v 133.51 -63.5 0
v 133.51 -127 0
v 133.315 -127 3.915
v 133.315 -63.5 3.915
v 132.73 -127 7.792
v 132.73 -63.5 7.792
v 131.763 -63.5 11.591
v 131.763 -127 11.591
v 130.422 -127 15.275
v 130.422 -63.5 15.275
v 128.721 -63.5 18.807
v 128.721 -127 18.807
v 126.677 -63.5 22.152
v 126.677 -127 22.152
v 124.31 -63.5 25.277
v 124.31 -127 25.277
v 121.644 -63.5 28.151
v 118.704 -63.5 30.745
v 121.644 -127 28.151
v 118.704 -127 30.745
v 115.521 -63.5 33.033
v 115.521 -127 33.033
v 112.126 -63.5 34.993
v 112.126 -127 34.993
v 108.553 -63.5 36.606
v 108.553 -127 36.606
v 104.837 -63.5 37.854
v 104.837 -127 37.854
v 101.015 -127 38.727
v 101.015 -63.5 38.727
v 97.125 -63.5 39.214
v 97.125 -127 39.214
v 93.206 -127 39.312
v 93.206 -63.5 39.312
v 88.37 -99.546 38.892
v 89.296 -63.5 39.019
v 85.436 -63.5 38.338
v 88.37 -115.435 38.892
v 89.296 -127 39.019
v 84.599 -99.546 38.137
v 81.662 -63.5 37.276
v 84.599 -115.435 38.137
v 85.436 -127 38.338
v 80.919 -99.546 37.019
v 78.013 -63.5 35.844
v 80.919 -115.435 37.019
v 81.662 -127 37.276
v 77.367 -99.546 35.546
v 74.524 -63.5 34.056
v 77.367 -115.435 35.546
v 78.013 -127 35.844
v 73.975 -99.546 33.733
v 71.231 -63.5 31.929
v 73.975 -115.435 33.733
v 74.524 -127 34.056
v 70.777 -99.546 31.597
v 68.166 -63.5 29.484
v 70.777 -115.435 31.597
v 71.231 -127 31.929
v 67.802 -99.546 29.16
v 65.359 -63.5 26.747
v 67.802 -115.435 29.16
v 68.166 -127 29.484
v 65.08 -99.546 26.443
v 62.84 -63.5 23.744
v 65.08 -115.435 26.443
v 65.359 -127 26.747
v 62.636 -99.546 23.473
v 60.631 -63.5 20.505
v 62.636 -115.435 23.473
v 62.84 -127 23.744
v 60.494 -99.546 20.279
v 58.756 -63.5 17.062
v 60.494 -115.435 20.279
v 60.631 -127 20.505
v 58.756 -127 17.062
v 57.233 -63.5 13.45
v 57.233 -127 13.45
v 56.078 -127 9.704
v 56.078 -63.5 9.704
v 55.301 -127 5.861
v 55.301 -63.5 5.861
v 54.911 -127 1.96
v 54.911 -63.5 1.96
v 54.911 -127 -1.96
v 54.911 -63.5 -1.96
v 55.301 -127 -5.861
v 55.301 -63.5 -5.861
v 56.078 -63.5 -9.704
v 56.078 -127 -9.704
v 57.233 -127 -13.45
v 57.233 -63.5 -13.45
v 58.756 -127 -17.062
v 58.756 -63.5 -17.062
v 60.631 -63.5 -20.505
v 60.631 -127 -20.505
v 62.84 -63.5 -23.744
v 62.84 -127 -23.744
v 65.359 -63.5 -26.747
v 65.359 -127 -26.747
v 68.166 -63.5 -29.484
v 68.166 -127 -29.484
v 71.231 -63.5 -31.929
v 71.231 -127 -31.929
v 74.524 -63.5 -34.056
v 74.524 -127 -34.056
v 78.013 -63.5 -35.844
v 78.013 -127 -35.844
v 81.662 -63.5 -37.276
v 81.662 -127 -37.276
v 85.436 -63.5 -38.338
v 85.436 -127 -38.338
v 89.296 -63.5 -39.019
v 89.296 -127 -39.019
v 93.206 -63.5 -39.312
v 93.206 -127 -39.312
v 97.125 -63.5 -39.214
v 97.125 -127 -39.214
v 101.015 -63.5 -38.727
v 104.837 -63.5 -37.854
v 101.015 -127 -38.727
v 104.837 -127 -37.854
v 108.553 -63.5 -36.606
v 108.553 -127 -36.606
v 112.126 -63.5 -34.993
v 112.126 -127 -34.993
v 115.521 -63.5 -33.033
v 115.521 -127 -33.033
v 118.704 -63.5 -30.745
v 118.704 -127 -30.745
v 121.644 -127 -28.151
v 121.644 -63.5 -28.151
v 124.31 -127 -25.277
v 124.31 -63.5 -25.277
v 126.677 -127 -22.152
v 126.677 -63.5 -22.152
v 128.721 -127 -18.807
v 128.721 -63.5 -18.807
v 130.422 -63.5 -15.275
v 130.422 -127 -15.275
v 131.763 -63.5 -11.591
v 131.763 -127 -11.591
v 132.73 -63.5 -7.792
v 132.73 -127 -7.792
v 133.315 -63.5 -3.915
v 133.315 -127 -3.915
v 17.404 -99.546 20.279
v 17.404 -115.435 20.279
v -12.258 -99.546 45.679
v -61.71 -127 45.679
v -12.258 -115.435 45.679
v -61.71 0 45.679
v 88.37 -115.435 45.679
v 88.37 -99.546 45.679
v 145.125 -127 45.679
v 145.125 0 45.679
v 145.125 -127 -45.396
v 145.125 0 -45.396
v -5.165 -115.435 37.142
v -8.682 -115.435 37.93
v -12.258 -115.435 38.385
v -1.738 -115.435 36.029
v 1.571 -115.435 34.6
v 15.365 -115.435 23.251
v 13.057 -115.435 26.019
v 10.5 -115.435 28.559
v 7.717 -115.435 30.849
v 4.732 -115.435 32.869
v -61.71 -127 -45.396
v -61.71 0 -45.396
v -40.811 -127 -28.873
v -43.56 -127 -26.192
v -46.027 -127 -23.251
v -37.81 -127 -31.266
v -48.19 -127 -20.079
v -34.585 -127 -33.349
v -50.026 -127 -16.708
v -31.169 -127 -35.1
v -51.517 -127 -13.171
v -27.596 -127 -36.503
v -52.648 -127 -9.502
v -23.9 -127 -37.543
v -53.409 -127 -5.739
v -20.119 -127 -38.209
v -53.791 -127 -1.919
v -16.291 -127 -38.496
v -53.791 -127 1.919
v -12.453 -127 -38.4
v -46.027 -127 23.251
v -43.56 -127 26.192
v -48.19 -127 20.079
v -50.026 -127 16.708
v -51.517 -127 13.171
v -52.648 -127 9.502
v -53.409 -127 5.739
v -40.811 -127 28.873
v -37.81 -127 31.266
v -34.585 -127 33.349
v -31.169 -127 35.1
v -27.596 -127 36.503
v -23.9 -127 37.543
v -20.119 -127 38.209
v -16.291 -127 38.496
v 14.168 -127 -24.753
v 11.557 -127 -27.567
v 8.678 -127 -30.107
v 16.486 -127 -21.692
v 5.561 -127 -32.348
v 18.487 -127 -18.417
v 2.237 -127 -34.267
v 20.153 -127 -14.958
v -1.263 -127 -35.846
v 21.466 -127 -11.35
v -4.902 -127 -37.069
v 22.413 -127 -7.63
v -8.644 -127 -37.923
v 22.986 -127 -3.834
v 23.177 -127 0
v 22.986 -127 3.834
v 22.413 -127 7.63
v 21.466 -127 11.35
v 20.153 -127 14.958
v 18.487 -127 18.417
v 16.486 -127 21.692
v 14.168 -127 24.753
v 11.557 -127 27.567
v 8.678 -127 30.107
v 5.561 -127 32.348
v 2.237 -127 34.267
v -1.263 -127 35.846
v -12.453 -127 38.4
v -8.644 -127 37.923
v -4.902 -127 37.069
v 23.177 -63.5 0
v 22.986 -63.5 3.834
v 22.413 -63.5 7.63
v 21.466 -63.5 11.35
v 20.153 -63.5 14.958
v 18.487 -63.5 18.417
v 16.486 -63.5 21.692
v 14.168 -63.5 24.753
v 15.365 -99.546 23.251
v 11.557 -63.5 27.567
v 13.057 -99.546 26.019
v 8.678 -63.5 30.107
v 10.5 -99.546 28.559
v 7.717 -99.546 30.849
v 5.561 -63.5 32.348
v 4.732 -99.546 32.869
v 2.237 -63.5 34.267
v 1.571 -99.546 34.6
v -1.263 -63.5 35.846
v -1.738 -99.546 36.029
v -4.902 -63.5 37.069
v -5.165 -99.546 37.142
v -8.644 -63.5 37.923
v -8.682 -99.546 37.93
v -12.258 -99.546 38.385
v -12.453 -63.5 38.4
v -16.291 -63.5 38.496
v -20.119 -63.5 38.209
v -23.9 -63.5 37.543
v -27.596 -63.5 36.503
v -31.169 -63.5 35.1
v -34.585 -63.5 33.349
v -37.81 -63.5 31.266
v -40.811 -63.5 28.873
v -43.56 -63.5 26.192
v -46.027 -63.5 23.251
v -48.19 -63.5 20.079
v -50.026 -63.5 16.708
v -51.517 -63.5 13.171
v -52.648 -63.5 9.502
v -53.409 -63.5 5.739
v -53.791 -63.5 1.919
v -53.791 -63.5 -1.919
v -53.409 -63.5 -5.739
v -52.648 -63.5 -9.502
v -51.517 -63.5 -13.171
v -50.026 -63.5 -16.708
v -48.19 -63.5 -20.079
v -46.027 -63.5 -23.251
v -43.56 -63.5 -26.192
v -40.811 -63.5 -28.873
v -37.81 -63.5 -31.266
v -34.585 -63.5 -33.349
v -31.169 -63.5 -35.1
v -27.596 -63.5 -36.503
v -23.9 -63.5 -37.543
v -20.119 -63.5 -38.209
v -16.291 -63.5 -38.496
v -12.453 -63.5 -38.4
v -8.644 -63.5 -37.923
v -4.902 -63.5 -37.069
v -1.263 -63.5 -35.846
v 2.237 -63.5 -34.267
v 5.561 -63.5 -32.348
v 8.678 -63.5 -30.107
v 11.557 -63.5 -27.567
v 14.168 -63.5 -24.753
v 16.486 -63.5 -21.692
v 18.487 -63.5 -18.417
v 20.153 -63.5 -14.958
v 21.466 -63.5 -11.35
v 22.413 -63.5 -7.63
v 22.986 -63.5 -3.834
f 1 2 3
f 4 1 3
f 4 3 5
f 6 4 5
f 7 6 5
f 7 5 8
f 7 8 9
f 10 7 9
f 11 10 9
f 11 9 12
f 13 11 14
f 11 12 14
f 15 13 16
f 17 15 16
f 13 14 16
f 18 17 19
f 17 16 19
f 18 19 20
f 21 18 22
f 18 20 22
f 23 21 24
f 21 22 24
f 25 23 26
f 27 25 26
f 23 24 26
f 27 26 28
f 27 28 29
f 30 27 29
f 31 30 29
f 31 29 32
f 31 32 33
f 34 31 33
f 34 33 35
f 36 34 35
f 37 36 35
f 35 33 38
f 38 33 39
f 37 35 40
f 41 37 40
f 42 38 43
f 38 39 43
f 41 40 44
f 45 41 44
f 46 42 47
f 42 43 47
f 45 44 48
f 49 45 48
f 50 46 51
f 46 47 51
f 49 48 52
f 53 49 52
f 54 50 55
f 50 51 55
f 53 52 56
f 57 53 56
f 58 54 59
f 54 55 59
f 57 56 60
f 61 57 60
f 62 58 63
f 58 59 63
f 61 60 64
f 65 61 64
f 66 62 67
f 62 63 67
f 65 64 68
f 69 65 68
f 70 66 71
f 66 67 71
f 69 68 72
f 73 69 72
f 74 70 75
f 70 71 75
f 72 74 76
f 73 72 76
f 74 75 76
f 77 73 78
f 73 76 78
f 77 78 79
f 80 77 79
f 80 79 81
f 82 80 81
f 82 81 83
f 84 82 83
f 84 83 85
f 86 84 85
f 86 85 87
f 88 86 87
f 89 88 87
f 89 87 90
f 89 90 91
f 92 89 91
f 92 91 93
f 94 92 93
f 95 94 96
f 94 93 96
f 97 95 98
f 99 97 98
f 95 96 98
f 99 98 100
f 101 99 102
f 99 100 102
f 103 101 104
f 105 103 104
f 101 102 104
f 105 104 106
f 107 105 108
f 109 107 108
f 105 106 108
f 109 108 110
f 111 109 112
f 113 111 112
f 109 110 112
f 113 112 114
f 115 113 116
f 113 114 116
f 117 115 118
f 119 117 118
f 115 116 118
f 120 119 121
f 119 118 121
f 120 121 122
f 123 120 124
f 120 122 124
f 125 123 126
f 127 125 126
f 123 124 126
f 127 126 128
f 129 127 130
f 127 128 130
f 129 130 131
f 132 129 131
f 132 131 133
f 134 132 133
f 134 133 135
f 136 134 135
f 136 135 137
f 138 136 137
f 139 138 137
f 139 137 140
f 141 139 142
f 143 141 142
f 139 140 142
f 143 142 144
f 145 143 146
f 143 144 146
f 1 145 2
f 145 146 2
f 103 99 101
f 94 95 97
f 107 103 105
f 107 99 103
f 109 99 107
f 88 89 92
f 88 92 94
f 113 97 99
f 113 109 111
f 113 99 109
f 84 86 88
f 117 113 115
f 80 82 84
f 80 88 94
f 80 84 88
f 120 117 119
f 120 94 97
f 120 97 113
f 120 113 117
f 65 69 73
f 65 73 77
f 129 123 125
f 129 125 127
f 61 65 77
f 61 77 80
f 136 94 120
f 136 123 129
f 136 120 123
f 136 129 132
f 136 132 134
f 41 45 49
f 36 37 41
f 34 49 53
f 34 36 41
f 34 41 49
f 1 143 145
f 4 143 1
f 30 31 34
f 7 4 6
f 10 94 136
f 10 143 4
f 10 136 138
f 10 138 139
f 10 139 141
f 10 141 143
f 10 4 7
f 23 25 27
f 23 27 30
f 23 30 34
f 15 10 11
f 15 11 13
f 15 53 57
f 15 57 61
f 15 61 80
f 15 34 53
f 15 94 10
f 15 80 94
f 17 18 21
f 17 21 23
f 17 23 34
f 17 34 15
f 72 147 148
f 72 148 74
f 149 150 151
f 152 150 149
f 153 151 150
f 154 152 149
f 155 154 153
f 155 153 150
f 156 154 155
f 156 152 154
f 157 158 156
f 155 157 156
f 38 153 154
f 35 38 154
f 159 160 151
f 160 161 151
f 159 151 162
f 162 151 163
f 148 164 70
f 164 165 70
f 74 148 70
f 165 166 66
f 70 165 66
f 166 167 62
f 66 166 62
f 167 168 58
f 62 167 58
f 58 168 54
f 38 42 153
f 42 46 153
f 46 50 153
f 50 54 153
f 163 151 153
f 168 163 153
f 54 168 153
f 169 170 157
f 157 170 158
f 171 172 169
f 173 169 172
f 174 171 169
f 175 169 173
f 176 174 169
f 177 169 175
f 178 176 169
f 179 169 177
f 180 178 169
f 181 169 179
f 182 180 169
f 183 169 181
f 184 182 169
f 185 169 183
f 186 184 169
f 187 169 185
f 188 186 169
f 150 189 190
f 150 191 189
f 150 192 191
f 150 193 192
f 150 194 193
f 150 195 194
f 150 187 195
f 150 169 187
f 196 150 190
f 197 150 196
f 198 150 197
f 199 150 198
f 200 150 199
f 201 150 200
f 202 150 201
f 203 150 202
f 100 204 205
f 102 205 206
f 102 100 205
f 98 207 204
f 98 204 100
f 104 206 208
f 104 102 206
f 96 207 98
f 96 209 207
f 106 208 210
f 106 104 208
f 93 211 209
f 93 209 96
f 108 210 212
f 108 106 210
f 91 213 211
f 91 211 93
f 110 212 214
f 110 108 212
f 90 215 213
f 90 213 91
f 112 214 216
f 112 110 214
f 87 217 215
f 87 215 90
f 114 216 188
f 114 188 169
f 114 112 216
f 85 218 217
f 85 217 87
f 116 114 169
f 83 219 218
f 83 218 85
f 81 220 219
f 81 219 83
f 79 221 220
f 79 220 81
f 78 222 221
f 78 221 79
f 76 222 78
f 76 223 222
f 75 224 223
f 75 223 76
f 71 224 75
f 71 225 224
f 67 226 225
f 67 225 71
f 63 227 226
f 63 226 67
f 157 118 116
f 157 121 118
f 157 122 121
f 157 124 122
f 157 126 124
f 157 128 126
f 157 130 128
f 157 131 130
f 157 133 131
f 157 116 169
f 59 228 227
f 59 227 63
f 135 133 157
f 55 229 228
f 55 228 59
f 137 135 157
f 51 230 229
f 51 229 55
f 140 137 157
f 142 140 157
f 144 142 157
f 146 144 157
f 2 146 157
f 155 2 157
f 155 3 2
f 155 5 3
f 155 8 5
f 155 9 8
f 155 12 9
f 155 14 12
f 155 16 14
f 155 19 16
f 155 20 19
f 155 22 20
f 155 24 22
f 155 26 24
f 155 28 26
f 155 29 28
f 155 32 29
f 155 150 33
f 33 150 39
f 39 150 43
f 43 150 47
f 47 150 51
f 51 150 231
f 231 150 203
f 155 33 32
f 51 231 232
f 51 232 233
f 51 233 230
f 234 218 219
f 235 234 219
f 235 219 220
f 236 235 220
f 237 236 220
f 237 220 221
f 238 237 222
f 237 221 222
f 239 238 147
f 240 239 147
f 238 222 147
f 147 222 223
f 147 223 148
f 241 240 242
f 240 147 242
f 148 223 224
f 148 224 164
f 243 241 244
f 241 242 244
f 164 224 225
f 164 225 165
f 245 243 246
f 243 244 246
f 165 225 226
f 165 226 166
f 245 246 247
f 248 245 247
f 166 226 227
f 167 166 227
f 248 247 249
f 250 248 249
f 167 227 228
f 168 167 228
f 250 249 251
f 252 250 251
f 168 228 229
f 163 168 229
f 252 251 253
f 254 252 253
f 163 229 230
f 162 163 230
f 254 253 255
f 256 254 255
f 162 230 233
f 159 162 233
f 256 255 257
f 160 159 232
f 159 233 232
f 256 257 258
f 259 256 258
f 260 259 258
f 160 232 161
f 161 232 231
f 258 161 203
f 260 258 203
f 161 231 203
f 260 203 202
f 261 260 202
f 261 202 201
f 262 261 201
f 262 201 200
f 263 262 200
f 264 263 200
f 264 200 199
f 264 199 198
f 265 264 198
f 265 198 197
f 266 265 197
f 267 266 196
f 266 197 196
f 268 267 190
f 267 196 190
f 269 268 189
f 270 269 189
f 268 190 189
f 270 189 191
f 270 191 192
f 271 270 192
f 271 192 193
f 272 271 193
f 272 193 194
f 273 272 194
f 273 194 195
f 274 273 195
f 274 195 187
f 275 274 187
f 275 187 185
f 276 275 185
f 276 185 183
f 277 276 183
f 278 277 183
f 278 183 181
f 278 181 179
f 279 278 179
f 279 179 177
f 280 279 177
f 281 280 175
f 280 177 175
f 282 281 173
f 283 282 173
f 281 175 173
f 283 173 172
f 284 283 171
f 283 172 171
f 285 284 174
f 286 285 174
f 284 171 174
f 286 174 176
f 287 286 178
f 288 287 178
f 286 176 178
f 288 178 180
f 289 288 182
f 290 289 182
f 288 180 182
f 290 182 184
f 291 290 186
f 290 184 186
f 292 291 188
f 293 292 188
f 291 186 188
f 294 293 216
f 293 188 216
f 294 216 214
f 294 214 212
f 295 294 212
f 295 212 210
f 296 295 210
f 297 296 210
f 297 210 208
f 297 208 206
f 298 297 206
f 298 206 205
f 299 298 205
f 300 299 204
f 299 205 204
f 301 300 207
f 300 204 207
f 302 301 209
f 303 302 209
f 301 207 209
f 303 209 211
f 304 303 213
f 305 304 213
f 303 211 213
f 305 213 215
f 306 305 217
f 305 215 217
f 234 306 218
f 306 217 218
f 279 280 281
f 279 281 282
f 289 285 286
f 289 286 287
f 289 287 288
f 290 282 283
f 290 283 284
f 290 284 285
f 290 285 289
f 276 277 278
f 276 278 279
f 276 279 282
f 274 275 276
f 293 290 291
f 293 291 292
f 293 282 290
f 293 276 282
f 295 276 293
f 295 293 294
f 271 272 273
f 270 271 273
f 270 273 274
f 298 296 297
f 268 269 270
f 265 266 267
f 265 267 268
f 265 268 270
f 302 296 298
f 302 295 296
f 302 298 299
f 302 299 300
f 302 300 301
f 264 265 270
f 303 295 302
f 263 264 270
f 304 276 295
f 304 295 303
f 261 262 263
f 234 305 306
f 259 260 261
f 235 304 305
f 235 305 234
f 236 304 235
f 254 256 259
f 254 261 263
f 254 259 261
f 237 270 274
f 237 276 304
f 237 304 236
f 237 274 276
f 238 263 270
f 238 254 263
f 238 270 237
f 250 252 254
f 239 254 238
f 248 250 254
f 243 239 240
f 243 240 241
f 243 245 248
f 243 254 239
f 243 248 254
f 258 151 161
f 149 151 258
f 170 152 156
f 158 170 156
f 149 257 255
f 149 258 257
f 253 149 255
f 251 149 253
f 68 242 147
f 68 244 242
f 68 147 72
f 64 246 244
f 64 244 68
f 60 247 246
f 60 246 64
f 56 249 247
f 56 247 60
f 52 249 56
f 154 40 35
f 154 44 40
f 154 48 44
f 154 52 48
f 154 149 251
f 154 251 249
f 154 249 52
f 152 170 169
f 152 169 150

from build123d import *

# Parameters (mm, degrees)
F0_W     = 206.834365
F0_H     = 91.075212
F1_DEPTH = 127
F2_DEPTH = 127
F3_R     = 38.508072
F3_R_2   = 39.324103
F4_DEPTH = 63.5
F5_W     = 100.627238
F5_H     = 15.888504
F6_DEPTH = 25.4


with BuildPart() as f1:
    # F0 (on Front) → F1 (new body)
    with BuildSketch(Plane.XZ):
        with Locations((41.707343, 0.141859)):
            Rectangle(F0_W, F0_H)
    extrude(amount=F1_DEPTH)

    # F0 (on Front) → F2 (join)
    with BuildSketch(Plane.XZ):
        with Locations((41.707343, 0.141859)):
            Rectangle(F0_W, F0_H)
    extrude(amount=F2_DEPTH)

    # F3 (on face) → F4 (cut)
    with BuildSketch(Plane.XZ.offset(127)):
        with Locations((-15.331196, 0)):
            Circle(F3_R)
        with Locations((94.186038, 0)):
            Circle(F3_R_2)
    extrude(amount=-F4_DEPTH, mode=Mode.SUBTRACT)

    # F5 (on face) → F6 (cut)
    with BuildSketch(Plane.XY.offset(45.679465)):
        with Locations((38.056093, -107.49064)):
            Rectangle(F5_W, F5_H)
    extrude(amount=-F6_DEPTH, mode=Mode.SUBTRACT)


solid = f1.part
